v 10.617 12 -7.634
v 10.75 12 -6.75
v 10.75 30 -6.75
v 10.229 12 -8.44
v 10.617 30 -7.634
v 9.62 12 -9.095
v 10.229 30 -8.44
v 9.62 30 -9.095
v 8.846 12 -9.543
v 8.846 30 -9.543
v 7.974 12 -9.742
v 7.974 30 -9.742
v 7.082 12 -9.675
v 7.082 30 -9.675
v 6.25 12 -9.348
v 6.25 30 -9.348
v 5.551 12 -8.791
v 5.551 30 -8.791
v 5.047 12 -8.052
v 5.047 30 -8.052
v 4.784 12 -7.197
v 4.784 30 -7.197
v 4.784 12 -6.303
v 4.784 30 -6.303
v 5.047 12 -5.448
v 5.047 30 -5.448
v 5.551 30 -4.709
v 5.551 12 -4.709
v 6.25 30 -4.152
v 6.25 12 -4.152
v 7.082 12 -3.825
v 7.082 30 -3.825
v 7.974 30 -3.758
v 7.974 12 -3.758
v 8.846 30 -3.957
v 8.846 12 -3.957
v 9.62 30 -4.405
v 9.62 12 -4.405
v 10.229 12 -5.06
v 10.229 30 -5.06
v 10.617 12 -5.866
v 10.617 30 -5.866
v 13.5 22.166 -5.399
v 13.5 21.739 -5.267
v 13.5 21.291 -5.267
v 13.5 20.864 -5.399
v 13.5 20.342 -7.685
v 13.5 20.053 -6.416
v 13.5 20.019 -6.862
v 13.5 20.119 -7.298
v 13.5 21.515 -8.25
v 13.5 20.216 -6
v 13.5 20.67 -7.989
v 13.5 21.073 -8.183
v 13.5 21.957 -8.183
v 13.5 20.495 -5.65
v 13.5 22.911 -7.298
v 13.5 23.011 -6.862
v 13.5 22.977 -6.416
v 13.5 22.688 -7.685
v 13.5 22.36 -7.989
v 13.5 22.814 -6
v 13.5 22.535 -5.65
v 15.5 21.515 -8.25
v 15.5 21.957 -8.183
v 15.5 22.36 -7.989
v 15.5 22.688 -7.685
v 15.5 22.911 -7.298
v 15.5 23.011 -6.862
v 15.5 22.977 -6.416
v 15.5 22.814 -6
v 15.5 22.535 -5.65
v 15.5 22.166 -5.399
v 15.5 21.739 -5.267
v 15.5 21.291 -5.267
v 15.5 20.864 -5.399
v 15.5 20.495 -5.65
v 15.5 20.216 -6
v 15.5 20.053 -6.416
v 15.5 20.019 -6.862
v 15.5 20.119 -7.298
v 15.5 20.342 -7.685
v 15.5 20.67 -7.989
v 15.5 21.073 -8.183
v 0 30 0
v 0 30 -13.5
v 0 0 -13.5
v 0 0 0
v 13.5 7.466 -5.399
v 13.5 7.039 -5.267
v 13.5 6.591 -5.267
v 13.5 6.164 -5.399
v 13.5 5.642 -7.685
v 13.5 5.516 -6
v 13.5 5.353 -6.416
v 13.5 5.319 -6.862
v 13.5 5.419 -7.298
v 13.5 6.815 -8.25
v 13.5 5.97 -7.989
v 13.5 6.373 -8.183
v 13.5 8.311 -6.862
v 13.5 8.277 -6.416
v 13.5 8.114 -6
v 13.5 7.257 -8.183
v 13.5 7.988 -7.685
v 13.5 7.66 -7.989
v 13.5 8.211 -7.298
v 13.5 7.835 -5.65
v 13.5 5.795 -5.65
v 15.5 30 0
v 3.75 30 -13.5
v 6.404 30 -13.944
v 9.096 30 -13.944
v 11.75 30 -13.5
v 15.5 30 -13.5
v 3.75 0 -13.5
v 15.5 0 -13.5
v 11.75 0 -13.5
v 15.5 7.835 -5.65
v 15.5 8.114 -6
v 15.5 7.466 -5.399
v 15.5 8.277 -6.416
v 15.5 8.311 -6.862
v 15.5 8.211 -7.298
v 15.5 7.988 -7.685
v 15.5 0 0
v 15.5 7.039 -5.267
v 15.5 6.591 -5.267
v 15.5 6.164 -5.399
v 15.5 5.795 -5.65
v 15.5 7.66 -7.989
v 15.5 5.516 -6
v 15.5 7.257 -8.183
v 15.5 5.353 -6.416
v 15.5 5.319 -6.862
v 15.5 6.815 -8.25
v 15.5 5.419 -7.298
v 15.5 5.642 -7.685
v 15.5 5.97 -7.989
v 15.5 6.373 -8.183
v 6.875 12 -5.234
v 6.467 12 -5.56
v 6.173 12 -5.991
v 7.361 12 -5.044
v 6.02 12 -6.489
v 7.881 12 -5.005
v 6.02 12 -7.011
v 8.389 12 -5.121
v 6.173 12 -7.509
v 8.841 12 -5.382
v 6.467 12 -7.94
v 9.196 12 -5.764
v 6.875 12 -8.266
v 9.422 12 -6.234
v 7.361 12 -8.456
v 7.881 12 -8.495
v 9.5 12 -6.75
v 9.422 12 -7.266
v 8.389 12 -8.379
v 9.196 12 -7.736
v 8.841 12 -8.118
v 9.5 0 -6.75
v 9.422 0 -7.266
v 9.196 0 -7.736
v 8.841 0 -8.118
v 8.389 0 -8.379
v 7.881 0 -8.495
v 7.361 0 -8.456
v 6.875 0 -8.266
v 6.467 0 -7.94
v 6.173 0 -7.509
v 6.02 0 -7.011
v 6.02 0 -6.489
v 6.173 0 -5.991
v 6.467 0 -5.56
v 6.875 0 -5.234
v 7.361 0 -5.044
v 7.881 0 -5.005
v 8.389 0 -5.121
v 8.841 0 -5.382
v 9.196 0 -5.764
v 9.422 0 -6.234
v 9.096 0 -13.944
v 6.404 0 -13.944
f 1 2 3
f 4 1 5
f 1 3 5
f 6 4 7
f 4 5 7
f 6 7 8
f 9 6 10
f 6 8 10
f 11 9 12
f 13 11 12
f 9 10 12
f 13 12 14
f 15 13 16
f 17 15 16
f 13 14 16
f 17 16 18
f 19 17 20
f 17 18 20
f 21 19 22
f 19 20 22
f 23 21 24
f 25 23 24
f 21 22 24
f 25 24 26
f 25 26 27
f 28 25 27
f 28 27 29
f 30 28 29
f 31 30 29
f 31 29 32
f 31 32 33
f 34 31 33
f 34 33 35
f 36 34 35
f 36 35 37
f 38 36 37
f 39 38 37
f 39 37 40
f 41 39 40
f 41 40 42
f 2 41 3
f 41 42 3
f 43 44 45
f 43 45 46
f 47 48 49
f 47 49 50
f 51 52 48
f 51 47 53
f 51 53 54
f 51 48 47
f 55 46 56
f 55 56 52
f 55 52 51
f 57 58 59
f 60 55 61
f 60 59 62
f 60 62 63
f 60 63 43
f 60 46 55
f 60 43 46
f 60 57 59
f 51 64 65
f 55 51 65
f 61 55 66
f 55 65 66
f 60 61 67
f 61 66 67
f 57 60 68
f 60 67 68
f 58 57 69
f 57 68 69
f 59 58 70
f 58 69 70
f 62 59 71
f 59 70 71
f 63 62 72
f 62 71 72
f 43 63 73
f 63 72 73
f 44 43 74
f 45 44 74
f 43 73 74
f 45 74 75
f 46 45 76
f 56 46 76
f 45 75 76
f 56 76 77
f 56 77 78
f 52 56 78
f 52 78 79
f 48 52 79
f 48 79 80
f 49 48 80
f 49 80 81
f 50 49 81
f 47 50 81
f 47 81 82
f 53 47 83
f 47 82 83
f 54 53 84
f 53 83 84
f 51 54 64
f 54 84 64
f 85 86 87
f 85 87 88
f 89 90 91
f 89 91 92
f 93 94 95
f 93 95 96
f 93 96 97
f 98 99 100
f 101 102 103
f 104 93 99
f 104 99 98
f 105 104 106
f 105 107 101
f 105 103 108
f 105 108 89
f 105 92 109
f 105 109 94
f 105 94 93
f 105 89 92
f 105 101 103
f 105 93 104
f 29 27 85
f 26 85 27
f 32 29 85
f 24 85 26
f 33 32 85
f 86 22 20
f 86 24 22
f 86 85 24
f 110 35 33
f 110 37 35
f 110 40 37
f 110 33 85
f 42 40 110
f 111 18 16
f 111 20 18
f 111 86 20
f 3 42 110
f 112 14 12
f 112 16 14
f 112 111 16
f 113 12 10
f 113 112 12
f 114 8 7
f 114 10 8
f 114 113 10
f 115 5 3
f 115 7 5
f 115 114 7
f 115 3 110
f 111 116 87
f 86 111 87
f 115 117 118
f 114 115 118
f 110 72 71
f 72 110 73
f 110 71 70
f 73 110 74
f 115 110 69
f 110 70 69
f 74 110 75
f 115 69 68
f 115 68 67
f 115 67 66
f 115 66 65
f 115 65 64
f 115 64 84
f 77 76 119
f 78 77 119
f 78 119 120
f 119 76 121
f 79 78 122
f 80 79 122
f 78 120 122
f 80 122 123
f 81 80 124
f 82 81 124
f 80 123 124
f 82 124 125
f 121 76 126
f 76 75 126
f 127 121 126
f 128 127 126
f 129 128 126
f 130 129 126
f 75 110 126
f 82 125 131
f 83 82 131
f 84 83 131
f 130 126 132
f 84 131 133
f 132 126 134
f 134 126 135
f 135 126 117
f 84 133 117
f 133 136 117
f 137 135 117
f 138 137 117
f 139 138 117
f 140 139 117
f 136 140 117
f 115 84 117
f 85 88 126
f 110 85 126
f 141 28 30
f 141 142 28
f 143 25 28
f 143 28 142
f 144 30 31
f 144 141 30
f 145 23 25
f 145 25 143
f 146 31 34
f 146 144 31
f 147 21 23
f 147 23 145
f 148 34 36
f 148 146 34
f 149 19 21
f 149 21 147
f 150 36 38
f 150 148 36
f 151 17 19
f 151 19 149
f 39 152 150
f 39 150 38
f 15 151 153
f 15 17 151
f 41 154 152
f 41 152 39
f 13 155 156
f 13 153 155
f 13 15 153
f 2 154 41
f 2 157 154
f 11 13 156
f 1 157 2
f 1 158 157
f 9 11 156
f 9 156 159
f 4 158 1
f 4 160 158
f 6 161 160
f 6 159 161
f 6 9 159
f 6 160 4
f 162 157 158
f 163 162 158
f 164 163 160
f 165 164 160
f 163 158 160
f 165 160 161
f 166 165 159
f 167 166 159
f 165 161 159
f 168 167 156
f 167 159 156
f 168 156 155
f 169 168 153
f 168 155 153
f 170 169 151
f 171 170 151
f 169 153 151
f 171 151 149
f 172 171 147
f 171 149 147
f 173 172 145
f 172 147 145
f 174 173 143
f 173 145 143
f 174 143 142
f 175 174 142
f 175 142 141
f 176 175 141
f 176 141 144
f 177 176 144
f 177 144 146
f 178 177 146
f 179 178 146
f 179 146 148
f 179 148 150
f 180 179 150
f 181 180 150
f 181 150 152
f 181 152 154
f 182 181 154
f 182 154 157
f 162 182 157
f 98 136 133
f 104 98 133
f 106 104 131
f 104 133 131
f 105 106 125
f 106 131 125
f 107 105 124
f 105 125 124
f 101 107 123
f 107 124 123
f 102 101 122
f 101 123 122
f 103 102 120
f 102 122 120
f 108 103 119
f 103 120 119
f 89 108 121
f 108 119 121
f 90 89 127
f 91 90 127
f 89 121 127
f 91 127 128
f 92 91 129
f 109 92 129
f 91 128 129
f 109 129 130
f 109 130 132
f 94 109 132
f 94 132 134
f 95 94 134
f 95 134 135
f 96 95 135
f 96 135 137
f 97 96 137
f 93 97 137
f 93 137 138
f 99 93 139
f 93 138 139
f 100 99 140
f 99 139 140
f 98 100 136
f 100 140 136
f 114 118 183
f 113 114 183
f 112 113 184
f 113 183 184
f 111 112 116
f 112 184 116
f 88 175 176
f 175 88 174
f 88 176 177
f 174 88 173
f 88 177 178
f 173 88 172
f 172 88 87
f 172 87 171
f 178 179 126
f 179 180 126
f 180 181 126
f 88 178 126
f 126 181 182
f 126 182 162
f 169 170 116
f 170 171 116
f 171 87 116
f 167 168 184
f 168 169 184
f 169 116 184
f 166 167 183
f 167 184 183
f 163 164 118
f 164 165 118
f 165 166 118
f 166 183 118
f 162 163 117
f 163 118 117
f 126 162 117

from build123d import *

# Parameters (mm, degrees)
BOSS_EXTRUDE1_DEPTH = 30
SKETCH2_R           = 3
CUT_EXTRUDE1_DEPTH  = 18
SKETCH3_R           = 1.75
CUT_EXTRUDE2_DEPTH  = 13
SKETCH4_R           = 1.5
CUT_EXTRUDE3_DEPTH  = 2


with BuildPart() as part:
    # Sketch1 → Boss-Extrude1 (new body)
    with BuildSketch(Plane(origin=(0, 0, 0), x_dir=(1, 0, 0), z_dir=(0, 1, 0))):
        with BuildLine():
            Line((0, 0), (15.5, 0))
            Line((15.5, 0), (15.5, 13.5))
            Line((15.5, 13.5), (11.75, 13.5))
            ThreePointArc((11.75, 13.5), (7.75, 14), (3.75, 13.5))
            Line((3.75, 13.5), (0, 13.5))
            Line((0, 13.5), (0, 0))
        make_face()
    extrude(amount=BOSS_EXTRUDE1_DEPTH)

    # Sketch2 → Cut-Extrude1 (cut)
    with BuildSketch(Plane(origin=(0, 30, 0), x_dir=(1, 0, 0), z_dir=(0, 1, 0))):
        with Locations((7.75, 6.75)):
            Circle(SKETCH2_R)
    extrude(amount=-CUT_EXTRUDE1_DEPTH, mode=Mode.SUBTRACT)

    # Sketch3 → Cut-Extrude2 (cut, through all)
    with BuildSketch(Plane(origin=(0, 12, 0), x_dir=(1, 0, 0), z_dir=(0, 1, 0))):
        with Locations((7.75, 6.75)):
            Circle(SKETCH3_R)
    extrude(amount=-CUT_EXTRUDE2_DEPTH, mode=Mode.SUBTRACT)

    # Sketch4 → Cut-Extrude3 (cut)
    with BuildSketch(Plane(origin=(15.5, 0, 0), x_dir=(0, 0, -1), z_dir=(1, 0, 0))):
        with Locations((6.75, 21.515)):
            Circle(SKETCH4_R)
        with Locations((6.75, 6.815)):
            Circle(SKETCH4_R)
    extrude(amount=-CUT_EXTRUDE3_DEPTH, mode=Mode.SUBTRACT)


solid = part.part
